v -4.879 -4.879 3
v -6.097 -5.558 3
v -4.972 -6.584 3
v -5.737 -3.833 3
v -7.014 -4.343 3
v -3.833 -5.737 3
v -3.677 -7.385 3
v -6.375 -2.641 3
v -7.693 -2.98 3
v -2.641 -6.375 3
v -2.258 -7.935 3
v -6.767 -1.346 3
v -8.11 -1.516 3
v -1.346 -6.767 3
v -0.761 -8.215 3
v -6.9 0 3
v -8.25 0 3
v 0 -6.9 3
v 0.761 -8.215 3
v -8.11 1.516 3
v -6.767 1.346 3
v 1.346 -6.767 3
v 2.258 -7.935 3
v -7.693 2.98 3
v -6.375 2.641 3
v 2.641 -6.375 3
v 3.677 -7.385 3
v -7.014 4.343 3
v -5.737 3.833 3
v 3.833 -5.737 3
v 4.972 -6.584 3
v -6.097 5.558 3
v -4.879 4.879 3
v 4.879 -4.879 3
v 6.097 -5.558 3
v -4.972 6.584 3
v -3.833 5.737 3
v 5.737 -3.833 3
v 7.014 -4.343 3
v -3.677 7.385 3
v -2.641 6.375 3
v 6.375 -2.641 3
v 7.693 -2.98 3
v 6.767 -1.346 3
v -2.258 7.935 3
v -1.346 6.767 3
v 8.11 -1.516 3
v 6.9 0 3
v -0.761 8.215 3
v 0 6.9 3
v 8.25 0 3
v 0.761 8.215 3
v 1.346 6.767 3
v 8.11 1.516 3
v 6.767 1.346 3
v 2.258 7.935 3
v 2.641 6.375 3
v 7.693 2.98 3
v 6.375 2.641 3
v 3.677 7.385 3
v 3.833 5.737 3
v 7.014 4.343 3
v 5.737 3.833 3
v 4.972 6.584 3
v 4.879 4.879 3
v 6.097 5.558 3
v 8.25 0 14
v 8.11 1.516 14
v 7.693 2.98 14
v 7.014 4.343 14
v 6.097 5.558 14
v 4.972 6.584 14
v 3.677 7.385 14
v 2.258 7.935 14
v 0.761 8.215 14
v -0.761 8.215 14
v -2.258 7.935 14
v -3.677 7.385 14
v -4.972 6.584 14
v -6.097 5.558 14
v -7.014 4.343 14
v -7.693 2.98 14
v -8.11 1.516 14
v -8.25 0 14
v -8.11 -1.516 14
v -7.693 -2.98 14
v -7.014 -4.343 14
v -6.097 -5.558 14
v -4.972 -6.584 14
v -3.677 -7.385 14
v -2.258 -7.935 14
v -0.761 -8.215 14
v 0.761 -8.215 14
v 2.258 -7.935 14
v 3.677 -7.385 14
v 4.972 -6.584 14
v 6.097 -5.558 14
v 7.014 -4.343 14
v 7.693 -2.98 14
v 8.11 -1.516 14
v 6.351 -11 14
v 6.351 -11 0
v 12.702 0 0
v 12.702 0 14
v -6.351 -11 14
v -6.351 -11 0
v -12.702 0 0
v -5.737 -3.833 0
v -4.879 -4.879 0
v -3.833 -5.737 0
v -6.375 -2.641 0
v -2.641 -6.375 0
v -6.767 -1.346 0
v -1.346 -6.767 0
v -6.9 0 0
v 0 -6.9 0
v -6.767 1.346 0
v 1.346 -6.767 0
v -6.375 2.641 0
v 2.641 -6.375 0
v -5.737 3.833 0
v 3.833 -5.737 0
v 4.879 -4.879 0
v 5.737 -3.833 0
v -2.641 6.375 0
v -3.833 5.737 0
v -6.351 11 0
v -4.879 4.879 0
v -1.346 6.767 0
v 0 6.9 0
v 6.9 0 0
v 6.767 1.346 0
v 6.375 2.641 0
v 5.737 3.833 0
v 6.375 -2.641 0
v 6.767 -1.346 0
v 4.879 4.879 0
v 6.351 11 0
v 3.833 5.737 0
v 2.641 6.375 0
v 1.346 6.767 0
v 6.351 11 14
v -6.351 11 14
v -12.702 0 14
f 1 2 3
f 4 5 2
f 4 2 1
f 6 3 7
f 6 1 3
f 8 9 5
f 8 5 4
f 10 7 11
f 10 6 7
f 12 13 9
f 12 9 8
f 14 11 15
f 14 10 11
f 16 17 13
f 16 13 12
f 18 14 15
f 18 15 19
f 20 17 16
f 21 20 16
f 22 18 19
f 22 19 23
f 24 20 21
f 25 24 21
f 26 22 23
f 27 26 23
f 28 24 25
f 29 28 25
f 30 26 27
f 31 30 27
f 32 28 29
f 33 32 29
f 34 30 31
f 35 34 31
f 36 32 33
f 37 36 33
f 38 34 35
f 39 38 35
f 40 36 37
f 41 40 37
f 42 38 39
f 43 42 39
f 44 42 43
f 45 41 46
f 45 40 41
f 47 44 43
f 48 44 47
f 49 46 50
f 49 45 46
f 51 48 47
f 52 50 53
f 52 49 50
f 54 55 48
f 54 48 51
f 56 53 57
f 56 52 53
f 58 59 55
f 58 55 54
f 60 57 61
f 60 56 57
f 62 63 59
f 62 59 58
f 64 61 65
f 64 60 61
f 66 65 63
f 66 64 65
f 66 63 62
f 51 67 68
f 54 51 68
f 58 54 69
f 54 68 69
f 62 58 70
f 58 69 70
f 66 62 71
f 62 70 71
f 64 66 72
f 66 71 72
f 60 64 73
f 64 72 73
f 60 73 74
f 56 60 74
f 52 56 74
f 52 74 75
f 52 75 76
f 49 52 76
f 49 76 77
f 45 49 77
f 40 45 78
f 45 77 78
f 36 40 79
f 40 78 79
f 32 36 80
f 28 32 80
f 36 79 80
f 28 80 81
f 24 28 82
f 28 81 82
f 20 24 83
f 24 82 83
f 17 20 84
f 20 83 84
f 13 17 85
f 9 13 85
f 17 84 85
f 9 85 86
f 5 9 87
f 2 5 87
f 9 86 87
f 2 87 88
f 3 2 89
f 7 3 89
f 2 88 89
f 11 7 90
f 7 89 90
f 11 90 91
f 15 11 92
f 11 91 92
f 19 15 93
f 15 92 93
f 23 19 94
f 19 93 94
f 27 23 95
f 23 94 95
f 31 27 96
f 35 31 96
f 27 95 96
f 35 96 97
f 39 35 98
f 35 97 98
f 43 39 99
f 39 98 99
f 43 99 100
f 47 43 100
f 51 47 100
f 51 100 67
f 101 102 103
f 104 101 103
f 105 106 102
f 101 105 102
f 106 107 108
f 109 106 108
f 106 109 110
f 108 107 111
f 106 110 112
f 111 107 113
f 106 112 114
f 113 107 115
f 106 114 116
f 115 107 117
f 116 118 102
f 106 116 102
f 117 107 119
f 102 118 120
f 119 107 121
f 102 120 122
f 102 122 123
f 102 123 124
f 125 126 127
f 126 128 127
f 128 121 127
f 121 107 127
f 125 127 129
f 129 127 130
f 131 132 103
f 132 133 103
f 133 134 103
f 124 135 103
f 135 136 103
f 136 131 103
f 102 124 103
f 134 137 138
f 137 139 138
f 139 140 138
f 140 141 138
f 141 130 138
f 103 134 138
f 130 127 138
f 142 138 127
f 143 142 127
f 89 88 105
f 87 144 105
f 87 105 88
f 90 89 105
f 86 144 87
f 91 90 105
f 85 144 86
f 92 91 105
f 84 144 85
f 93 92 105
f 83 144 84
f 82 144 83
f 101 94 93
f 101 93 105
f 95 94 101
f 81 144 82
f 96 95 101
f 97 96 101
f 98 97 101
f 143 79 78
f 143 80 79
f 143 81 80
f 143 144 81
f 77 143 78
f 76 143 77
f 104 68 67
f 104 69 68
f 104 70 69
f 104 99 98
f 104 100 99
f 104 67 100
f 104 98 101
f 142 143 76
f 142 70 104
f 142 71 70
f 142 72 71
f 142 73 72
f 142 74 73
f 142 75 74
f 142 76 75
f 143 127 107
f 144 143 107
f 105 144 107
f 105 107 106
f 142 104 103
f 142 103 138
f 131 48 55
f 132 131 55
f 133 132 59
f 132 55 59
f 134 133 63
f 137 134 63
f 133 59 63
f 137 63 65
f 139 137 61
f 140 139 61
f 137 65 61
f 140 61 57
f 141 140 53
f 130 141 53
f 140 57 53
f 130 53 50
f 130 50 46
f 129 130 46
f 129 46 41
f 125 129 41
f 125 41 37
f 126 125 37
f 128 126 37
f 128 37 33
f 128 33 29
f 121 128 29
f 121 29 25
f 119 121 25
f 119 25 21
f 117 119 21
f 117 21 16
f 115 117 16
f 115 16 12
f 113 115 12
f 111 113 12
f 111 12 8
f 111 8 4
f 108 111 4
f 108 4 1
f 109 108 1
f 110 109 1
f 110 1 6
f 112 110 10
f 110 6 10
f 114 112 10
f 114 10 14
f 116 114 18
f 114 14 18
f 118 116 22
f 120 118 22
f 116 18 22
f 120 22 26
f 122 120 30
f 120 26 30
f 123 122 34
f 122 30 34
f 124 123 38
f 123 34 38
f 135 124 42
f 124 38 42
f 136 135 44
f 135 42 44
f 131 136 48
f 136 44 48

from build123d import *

# Parameters (mm, degrees)
LINEAR_AUSTRAGEN1_DEPTH         = 14
SKIZZE2_R                       = 6.9
SCHNITT_LINEAR_AUSTRAGEN1_DEPTH = 22.870832936
SKIZZE3_R                       = 8.25
SCHNITT_LINEAR_AUSTRAGEN2_DEPTH = 11


with BuildPart() as part:
    # Skizze1 → Linear austragen1 (new body)
    with BuildSketch(Plane.XY):
        Polygon((-12.701705922, 0), (-6.350852961, -11), (6.350852961, -11), (12.701705922, 0), (6.350852961, 11), (-6.350852961, 11), align=None)
    extrude(amount=LINEAR_AUSTRAGEN1_DEPTH)

    # Skizze2 → Schnitt-Linear austragen1 (cut, through all)
    with BuildSketch(Plane.XY.offset(14)):
        Circle(SKIZZE2_R)
    extrude(amount=-SCHNITT_LINEAR_AUSTRAGEN1_DEPTH, mode=Mode.SUBTRACT)

    # Skizze3 → Schnitt-Linear austragen2 (cut)
    with BuildSketch(Plane.XY.offset(14)):
        Circle(SKIZZE3_R)
    extrude(amount=-SCHNITT_LINEAR_AUSTRAGEN2_DEPTH, mode=Mode.SUBTRACT)


solid = part.part
